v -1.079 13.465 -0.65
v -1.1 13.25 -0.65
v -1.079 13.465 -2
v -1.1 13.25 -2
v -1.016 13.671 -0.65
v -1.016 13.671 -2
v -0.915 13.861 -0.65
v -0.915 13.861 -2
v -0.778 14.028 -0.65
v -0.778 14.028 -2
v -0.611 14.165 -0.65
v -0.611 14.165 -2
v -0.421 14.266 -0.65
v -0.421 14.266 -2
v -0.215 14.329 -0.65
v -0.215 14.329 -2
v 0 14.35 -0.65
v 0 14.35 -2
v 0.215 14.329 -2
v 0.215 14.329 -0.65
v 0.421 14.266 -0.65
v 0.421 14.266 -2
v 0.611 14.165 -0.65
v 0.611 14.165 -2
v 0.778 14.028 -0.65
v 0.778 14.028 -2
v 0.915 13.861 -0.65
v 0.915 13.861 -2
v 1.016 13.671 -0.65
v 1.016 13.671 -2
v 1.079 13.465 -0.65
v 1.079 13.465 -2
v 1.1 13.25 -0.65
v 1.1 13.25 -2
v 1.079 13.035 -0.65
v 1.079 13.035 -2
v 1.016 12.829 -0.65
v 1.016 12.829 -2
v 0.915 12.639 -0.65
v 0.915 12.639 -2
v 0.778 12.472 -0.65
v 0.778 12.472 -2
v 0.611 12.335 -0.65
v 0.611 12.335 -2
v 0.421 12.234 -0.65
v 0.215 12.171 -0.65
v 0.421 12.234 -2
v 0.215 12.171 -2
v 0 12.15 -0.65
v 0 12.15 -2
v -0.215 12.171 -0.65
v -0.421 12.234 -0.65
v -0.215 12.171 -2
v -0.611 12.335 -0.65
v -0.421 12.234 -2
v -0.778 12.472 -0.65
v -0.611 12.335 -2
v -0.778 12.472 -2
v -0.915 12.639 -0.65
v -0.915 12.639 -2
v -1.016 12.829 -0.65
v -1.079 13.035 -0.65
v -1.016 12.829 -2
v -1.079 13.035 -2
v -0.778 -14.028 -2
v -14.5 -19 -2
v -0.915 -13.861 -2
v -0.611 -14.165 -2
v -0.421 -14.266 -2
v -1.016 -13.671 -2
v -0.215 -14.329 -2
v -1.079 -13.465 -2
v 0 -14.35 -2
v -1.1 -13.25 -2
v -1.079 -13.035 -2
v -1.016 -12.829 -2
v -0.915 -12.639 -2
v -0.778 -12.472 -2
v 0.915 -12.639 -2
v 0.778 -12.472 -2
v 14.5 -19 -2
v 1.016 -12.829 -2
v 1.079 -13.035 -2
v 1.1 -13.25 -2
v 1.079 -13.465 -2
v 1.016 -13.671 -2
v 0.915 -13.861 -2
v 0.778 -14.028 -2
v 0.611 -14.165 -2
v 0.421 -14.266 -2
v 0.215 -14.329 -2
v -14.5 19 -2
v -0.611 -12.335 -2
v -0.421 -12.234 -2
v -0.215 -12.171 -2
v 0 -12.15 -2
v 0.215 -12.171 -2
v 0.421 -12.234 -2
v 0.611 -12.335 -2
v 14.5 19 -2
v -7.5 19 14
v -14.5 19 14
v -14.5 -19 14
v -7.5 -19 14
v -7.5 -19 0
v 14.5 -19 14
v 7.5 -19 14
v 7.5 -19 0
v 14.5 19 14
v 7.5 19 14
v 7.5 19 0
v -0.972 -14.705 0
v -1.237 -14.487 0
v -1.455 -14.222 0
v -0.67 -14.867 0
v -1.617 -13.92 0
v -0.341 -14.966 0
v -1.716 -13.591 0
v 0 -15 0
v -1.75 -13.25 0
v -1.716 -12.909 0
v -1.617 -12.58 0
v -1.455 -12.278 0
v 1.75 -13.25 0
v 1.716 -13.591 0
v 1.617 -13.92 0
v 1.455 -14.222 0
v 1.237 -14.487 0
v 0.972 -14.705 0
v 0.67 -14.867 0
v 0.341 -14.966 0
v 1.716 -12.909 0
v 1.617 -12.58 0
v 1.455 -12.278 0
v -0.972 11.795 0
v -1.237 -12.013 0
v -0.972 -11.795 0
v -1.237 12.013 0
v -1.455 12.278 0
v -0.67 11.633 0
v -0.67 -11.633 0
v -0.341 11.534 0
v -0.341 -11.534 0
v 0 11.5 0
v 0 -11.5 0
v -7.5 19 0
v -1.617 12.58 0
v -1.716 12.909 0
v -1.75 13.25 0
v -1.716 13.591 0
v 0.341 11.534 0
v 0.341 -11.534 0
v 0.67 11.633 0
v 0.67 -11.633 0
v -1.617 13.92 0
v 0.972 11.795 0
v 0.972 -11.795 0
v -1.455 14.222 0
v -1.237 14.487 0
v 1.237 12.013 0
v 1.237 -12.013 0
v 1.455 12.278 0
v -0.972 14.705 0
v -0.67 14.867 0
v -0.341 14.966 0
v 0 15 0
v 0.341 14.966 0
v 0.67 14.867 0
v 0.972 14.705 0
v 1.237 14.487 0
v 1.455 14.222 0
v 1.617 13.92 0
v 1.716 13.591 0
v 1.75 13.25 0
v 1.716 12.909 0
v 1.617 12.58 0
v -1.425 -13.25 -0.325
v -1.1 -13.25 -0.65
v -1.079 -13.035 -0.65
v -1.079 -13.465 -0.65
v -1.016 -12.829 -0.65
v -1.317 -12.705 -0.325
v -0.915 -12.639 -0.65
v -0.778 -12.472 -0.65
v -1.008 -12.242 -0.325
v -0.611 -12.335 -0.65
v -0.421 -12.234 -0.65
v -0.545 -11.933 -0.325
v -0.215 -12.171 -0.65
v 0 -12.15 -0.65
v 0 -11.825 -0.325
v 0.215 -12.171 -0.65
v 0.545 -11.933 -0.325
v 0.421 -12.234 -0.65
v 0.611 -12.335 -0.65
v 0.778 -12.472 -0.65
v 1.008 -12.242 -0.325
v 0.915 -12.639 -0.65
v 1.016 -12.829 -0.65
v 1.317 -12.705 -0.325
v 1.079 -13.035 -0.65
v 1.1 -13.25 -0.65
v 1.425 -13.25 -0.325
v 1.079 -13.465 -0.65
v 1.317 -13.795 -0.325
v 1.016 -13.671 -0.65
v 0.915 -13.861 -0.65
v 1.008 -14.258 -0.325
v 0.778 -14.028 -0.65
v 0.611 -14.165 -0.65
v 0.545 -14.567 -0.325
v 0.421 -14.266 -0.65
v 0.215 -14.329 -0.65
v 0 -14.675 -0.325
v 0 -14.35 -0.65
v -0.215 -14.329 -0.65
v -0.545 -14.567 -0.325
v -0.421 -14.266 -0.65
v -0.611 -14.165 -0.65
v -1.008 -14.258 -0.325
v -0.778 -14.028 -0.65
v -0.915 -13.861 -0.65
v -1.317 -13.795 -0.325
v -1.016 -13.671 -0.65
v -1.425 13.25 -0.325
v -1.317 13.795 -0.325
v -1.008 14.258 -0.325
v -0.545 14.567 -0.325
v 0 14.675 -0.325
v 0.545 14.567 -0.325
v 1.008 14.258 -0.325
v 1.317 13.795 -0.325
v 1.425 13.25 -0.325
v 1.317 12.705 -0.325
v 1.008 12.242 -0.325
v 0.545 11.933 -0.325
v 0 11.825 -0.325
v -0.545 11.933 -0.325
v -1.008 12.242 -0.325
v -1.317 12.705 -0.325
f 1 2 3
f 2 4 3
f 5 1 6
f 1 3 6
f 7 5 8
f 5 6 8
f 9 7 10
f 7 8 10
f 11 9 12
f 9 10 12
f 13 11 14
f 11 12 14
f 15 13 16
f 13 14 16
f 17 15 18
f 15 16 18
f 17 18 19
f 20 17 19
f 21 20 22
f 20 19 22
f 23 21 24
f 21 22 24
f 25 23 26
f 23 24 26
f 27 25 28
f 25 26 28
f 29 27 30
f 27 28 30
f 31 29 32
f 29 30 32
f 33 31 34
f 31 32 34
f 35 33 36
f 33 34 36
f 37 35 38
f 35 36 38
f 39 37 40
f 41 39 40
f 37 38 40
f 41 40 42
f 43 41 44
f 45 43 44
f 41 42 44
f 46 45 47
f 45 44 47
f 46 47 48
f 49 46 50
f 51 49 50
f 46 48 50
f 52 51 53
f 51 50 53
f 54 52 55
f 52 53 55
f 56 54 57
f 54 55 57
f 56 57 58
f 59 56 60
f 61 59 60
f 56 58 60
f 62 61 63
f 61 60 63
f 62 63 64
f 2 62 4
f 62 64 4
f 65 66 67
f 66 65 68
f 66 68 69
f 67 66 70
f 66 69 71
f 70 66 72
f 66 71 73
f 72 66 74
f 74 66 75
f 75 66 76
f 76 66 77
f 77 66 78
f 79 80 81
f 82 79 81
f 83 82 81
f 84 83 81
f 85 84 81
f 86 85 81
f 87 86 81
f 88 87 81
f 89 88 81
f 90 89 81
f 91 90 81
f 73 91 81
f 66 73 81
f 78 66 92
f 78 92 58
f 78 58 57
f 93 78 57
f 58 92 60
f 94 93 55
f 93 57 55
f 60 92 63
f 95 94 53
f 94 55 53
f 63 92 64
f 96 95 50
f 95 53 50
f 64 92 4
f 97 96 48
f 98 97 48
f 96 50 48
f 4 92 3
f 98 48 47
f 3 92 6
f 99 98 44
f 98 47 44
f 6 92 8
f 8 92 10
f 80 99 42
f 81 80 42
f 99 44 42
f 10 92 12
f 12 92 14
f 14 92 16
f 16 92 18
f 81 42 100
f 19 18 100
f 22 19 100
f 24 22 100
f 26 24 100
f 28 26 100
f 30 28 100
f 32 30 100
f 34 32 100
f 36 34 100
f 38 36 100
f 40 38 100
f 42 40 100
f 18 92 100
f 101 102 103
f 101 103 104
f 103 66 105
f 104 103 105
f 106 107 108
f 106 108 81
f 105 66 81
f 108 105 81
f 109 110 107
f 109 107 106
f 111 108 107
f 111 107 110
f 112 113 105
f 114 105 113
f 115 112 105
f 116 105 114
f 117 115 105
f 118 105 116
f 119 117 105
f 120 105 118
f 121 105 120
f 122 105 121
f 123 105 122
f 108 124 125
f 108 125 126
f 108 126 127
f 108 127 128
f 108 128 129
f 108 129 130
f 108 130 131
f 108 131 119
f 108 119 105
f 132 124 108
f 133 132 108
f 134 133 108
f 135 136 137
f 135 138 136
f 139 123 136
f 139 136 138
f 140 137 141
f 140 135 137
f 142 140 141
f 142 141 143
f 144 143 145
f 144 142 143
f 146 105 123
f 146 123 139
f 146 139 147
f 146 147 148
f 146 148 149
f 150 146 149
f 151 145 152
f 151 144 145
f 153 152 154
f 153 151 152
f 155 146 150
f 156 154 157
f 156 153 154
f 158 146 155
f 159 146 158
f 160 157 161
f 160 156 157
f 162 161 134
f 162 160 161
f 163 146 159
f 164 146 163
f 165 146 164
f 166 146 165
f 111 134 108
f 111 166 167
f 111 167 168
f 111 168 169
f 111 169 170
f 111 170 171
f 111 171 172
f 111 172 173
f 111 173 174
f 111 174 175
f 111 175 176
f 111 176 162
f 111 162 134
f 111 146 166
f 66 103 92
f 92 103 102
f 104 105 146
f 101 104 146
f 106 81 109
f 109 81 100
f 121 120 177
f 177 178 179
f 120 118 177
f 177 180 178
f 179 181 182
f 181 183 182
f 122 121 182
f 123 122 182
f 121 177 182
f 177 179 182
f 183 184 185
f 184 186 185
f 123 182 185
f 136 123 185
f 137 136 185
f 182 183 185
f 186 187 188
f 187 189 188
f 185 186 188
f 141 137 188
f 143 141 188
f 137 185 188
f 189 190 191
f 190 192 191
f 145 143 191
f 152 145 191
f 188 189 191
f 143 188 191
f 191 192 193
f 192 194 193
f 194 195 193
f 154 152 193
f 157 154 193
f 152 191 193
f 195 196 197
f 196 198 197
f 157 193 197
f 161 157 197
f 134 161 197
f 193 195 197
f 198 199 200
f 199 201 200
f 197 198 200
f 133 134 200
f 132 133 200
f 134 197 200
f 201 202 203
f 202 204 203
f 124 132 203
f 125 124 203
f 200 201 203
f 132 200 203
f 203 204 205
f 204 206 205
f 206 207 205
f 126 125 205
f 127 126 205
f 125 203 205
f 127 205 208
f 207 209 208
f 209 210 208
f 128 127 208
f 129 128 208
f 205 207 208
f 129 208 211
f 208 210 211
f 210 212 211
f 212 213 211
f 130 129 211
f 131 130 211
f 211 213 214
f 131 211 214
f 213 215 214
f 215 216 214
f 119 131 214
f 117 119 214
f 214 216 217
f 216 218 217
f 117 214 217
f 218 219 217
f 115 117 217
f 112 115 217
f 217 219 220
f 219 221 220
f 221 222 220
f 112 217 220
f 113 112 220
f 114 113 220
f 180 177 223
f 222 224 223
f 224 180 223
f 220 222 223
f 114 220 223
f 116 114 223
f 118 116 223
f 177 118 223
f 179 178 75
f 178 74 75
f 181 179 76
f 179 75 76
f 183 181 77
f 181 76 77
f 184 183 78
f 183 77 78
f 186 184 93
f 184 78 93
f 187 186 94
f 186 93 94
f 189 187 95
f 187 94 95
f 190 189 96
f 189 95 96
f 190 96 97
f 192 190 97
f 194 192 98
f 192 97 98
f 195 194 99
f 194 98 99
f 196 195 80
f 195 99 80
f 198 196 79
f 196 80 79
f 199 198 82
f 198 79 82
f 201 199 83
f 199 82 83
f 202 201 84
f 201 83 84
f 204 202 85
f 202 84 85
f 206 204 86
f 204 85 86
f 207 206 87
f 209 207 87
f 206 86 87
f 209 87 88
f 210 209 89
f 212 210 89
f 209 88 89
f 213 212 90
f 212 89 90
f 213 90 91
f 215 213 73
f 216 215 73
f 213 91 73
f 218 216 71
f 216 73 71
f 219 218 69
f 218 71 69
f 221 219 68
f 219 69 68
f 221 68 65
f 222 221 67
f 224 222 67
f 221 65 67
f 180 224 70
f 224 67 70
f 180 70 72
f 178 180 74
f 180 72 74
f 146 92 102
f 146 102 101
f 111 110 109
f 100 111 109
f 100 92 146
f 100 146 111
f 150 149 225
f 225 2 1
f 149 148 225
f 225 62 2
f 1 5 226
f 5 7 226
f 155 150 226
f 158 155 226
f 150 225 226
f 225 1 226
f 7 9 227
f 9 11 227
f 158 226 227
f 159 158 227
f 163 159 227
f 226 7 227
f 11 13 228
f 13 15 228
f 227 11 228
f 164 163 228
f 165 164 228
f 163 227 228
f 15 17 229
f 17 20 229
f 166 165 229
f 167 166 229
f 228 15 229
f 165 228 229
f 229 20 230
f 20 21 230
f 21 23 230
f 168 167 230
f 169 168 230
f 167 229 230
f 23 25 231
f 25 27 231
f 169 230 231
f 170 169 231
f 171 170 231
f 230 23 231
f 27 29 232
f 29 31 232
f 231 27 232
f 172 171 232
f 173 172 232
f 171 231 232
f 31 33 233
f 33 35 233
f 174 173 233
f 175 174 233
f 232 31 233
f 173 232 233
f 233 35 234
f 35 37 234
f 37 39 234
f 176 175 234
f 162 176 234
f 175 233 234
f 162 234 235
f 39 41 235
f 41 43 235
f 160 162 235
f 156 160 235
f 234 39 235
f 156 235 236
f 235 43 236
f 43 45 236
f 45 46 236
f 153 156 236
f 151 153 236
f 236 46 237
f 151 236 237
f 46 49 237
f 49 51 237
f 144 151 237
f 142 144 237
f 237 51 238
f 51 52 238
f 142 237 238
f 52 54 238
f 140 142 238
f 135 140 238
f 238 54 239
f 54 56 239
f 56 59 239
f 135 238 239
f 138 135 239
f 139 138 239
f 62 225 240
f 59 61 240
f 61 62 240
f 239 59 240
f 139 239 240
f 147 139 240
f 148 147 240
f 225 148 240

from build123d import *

# Parameters (mm, degrees)
SKETCH001_W      = 29
SKETCH001_H      = 38
PAD_DEPTH        = 2
SKETCH_W         = 7
SKETCH_H         = 38
PAD001_DEPTH     = 14
HOLE_D           = 2.2
HOLE_DEPTH       = 25
HOLE_CSINK_D     = 3.5
HOLE_CSINK_ANGLE = 90


with BuildPart() as part:
    # Sketch001 → Pad (new body)
    with BuildSketch(Plane.XY):
        Rectangle(SKETCH001_W, SKETCH001_H)
    extrude(amount=-PAD_DEPTH)

    # Sketch → Pad001 (join)
    with BuildSketch(Plane.XY):
        with Locations((11, 0)):
            Rectangle(SKETCH_W, SKETCH_H)
        with Locations((-11, 0)):
            Rectangle(SKETCH_W, SKETCH_H)
    extrude(amount=PAD001_DEPTH)

    # Hole
    with Locations(Plane.XY):
        with Locations((0, 13.25), (0, -13.25)):
            CounterSinkHole(HOLE_D / 2, HOLE_CSINK_D / 2, depth=HOLE_DEPTH, counter_sink_angle=HOLE_CSINK_ANGLE)


solid = part.part
